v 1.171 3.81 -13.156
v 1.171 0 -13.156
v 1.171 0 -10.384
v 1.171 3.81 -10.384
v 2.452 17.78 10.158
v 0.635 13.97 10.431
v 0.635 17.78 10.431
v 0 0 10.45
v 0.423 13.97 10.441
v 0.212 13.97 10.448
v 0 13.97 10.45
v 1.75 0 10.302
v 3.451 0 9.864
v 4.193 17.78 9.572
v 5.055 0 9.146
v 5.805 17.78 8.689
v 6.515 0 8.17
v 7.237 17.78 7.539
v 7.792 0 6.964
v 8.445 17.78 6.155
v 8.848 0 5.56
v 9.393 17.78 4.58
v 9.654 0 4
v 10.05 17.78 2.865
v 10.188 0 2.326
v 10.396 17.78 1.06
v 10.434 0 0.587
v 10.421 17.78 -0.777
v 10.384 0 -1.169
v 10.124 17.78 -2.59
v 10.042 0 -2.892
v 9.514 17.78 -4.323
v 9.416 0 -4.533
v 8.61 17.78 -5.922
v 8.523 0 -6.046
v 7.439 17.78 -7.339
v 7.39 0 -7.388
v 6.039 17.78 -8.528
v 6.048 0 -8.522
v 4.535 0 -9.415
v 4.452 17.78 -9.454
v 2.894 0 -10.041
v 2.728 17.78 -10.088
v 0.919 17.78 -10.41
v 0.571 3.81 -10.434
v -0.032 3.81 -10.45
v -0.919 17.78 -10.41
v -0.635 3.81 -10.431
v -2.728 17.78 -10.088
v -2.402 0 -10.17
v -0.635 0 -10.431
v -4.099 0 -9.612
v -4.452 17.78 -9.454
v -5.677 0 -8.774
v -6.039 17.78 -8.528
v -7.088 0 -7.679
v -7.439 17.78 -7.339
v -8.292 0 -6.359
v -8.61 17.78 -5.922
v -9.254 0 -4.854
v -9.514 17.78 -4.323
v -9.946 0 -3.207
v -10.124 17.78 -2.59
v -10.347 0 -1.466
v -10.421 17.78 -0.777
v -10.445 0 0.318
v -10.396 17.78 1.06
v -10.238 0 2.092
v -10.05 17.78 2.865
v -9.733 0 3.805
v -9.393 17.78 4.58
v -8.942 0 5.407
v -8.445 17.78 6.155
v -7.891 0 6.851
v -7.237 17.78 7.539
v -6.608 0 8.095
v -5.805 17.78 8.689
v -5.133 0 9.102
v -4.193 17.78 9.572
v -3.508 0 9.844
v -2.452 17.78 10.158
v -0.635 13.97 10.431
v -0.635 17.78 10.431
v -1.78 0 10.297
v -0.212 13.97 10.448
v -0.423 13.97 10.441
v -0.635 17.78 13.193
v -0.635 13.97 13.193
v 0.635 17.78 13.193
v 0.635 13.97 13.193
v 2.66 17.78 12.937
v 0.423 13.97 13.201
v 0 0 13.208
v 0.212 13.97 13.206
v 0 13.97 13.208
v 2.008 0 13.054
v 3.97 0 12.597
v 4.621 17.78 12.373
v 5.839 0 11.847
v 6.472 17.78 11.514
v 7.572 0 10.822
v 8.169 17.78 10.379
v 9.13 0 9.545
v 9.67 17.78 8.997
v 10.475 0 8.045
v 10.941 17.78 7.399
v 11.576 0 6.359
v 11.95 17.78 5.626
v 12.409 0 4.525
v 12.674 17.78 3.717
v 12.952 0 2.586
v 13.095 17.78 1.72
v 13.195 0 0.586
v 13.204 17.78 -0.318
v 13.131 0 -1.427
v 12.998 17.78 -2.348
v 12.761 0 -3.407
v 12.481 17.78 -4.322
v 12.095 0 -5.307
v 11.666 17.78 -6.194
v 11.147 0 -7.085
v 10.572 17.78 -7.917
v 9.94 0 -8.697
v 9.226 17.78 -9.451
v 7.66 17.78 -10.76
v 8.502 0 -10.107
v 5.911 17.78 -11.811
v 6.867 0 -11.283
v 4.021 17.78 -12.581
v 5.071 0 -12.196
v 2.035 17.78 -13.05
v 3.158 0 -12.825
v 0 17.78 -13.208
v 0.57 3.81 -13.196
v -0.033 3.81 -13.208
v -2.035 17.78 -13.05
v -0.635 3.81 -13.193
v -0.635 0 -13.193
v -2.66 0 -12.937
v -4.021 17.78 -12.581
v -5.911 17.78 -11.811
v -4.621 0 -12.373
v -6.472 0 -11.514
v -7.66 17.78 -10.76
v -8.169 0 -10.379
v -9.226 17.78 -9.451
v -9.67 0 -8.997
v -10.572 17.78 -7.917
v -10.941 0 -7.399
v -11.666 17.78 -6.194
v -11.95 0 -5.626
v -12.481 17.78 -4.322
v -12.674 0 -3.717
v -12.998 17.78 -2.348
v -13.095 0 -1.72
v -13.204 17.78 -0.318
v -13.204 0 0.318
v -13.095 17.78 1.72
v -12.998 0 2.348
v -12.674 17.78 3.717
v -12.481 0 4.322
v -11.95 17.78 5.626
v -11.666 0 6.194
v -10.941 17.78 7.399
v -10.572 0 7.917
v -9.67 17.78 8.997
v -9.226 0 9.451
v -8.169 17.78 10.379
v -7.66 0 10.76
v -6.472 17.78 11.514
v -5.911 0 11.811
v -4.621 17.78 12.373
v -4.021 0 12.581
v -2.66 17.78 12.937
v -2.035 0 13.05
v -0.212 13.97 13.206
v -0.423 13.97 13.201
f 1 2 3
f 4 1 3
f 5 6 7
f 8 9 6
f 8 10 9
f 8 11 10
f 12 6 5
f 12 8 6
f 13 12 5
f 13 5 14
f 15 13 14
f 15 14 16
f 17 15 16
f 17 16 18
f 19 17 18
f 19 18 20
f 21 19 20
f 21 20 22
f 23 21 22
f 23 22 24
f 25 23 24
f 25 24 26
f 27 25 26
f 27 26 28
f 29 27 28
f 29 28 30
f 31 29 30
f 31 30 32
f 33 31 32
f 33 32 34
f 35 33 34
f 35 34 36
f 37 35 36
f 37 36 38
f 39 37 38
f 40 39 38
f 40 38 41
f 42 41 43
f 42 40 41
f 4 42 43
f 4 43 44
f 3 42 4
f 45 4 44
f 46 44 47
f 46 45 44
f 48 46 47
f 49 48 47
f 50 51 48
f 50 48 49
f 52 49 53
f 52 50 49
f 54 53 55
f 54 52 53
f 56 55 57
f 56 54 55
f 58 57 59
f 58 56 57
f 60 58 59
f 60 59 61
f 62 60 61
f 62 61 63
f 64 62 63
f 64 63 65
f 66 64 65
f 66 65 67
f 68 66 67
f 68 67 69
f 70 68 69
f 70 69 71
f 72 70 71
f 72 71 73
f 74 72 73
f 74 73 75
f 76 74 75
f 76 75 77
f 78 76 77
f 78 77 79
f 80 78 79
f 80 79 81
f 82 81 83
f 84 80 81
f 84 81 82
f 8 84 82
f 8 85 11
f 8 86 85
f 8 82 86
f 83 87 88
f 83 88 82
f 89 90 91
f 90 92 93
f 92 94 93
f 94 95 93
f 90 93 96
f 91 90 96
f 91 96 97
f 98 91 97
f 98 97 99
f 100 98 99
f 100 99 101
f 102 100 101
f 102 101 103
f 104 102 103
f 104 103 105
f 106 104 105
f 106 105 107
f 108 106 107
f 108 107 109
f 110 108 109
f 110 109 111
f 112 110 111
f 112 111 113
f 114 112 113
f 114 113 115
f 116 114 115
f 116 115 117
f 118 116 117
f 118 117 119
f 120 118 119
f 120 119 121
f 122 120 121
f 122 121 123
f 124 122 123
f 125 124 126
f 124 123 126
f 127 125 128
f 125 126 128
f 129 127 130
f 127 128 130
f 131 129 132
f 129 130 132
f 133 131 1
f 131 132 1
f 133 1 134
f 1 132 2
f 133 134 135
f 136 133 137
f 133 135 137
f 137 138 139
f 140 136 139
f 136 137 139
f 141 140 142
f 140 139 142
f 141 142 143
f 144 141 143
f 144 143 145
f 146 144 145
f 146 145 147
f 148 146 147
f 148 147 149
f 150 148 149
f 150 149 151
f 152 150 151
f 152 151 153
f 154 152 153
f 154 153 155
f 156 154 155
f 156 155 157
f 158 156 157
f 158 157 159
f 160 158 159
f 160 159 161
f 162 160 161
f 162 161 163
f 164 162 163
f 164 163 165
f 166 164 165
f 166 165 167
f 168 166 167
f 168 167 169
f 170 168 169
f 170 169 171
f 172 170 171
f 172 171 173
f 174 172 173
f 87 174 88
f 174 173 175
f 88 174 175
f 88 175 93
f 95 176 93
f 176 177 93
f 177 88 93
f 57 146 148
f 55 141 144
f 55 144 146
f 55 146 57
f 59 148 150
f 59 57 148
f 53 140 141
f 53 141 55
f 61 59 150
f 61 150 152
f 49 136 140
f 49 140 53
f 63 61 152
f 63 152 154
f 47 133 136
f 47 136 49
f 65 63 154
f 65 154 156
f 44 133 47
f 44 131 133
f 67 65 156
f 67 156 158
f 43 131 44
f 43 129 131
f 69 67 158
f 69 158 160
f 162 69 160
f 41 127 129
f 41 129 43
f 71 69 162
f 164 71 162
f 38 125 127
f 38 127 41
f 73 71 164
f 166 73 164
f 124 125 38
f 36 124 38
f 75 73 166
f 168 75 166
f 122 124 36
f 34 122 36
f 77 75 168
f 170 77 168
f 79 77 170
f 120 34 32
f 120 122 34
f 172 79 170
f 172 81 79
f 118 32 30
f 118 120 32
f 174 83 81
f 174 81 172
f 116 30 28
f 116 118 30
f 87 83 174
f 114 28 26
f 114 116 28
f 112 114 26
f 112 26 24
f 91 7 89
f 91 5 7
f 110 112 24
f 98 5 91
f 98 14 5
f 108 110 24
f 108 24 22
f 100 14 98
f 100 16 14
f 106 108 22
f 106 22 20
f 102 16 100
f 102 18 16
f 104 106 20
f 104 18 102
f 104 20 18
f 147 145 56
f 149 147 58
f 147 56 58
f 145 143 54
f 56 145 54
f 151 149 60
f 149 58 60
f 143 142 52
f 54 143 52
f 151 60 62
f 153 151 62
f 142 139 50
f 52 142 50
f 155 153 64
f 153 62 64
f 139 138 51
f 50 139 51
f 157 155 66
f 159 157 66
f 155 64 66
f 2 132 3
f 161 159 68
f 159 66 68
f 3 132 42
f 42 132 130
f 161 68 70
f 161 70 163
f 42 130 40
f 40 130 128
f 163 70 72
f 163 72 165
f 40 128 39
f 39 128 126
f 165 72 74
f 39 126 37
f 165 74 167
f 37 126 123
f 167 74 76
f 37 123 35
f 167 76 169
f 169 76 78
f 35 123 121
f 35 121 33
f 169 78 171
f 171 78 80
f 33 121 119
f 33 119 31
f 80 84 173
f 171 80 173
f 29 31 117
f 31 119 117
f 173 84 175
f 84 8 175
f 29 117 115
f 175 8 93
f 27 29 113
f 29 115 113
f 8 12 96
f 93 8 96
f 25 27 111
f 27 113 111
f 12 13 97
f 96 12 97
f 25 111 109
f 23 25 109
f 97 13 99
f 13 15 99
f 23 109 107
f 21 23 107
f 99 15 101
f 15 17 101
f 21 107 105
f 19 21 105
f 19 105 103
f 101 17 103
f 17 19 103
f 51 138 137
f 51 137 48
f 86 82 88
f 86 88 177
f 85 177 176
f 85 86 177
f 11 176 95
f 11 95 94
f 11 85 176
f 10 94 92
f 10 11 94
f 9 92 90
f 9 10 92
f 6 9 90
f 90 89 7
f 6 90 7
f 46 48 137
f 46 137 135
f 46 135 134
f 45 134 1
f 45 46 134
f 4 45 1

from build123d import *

# Parameters (mm, degrees)
SKETCH1_R           = 13.208
SKETCH1_R_2         = 10.45
BOSS_EXTRUDE1_DEPTH = 17.78
SKETCH2_W           = 1.27
SKETCH2_H           = 3.587114975
CUT_EXTRUDE1_DEPTH  = 3.81
SKETCH3_W           = 1.806448
SKETCH3_H           = 4.299301561
CUT_EXTRUDE2_DEPTH  = 3.81


with BuildPart() as part:
    # Sketch1 → Boss-Extrude1 (new body)
    with BuildSketch(Plane(origin=(0, 0, 0), x_dir=(1, 0, 0), z_dir=(0, 1, 0))):
        with Locations(Location((0, 0, 0), (0, 0, 270))):
            Circle(SKETCH1_R)
        with Locations(Location((0, 0, 0), (0, 0, 270))):
            Circle(SKETCH1_R_2, mode=Mode.SUBTRACT)
    extrude(amount=BOSS_EXTRUDE1_DEPTH)

    # Sketch2 → Cut-Extrude1 (cut)
    with BuildSketch(Plane(origin=(0, 17.78, 0), x_dir=(1, 0, 0), z_dir=(0, 1, 0))):
        with Locations((0, -11.851276013)):
            Rectangle(SKETCH2_W, SKETCH2_H)
    extrude(amount=-CUT_EXTRUDE1_DEPTH, mode=Mode.SUBTRACT)

    # Sketch3 → Cut-Extrude2 (cut)
    with BuildSketch(Plane.XZ):
        with Locations((0.268224, -12.348416978)):
            Rectangle(SKETCH3_W, SKETCH3_H)
    extrude(amount=-CUT_EXTRUDE2_DEPTH, mode=Mode.SUBTRACT)


solid = part.part
